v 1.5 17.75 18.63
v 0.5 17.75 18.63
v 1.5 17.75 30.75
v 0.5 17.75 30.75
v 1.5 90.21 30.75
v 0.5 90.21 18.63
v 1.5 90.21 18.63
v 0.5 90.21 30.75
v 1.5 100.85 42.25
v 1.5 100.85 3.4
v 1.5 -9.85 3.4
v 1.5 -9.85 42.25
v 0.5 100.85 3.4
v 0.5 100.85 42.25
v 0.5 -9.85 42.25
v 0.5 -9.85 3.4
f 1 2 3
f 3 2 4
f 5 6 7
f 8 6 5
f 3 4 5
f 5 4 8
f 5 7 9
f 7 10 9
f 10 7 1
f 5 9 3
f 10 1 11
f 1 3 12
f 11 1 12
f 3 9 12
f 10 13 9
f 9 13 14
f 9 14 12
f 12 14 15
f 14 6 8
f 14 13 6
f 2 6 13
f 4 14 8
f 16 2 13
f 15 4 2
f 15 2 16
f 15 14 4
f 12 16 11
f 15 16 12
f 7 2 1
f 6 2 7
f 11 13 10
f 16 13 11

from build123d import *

# Parameters (mm, degrees)
SKETCH_1_W          = 110.7
SKETCH_1_H          = 38.85
EXTRUDE_1_DEPTH     = 1
SKETCH_2_W          = 12.12
SKETCH_2_H          = 72.46
CUT_EXTRUDE_1_DEPTH = 10


with BuildPart() as part:
    # Эскиз1 → Бобышка-Вытянуть1 (new body)
    with BuildSketch(Plane(origin=(0.5, 0, 0), x_dir=(0, -1, 0), z_dir=(-1, 0, 0))):
        with Locations((-45.5, 22.825)):
            Rectangle(SKETCH_1_W, SKETCH_1_H)
    extrude(amount=-EXTRUDE_1_DEPTH)

    # Эскиз2 → Вырез-Вытянуть1 (cut)
    with BuildSketch(Plane.ZY.offset(-0.5)):
        with Locations((24.69, 53.98)):
            Rectangle(SKETCH_2_W, SKETCH_2_H)
    extrude(amount=-CUT_EXTRUDE_1_DEPTH, mode=Mode.SUBTRACT)


solid = part.part
